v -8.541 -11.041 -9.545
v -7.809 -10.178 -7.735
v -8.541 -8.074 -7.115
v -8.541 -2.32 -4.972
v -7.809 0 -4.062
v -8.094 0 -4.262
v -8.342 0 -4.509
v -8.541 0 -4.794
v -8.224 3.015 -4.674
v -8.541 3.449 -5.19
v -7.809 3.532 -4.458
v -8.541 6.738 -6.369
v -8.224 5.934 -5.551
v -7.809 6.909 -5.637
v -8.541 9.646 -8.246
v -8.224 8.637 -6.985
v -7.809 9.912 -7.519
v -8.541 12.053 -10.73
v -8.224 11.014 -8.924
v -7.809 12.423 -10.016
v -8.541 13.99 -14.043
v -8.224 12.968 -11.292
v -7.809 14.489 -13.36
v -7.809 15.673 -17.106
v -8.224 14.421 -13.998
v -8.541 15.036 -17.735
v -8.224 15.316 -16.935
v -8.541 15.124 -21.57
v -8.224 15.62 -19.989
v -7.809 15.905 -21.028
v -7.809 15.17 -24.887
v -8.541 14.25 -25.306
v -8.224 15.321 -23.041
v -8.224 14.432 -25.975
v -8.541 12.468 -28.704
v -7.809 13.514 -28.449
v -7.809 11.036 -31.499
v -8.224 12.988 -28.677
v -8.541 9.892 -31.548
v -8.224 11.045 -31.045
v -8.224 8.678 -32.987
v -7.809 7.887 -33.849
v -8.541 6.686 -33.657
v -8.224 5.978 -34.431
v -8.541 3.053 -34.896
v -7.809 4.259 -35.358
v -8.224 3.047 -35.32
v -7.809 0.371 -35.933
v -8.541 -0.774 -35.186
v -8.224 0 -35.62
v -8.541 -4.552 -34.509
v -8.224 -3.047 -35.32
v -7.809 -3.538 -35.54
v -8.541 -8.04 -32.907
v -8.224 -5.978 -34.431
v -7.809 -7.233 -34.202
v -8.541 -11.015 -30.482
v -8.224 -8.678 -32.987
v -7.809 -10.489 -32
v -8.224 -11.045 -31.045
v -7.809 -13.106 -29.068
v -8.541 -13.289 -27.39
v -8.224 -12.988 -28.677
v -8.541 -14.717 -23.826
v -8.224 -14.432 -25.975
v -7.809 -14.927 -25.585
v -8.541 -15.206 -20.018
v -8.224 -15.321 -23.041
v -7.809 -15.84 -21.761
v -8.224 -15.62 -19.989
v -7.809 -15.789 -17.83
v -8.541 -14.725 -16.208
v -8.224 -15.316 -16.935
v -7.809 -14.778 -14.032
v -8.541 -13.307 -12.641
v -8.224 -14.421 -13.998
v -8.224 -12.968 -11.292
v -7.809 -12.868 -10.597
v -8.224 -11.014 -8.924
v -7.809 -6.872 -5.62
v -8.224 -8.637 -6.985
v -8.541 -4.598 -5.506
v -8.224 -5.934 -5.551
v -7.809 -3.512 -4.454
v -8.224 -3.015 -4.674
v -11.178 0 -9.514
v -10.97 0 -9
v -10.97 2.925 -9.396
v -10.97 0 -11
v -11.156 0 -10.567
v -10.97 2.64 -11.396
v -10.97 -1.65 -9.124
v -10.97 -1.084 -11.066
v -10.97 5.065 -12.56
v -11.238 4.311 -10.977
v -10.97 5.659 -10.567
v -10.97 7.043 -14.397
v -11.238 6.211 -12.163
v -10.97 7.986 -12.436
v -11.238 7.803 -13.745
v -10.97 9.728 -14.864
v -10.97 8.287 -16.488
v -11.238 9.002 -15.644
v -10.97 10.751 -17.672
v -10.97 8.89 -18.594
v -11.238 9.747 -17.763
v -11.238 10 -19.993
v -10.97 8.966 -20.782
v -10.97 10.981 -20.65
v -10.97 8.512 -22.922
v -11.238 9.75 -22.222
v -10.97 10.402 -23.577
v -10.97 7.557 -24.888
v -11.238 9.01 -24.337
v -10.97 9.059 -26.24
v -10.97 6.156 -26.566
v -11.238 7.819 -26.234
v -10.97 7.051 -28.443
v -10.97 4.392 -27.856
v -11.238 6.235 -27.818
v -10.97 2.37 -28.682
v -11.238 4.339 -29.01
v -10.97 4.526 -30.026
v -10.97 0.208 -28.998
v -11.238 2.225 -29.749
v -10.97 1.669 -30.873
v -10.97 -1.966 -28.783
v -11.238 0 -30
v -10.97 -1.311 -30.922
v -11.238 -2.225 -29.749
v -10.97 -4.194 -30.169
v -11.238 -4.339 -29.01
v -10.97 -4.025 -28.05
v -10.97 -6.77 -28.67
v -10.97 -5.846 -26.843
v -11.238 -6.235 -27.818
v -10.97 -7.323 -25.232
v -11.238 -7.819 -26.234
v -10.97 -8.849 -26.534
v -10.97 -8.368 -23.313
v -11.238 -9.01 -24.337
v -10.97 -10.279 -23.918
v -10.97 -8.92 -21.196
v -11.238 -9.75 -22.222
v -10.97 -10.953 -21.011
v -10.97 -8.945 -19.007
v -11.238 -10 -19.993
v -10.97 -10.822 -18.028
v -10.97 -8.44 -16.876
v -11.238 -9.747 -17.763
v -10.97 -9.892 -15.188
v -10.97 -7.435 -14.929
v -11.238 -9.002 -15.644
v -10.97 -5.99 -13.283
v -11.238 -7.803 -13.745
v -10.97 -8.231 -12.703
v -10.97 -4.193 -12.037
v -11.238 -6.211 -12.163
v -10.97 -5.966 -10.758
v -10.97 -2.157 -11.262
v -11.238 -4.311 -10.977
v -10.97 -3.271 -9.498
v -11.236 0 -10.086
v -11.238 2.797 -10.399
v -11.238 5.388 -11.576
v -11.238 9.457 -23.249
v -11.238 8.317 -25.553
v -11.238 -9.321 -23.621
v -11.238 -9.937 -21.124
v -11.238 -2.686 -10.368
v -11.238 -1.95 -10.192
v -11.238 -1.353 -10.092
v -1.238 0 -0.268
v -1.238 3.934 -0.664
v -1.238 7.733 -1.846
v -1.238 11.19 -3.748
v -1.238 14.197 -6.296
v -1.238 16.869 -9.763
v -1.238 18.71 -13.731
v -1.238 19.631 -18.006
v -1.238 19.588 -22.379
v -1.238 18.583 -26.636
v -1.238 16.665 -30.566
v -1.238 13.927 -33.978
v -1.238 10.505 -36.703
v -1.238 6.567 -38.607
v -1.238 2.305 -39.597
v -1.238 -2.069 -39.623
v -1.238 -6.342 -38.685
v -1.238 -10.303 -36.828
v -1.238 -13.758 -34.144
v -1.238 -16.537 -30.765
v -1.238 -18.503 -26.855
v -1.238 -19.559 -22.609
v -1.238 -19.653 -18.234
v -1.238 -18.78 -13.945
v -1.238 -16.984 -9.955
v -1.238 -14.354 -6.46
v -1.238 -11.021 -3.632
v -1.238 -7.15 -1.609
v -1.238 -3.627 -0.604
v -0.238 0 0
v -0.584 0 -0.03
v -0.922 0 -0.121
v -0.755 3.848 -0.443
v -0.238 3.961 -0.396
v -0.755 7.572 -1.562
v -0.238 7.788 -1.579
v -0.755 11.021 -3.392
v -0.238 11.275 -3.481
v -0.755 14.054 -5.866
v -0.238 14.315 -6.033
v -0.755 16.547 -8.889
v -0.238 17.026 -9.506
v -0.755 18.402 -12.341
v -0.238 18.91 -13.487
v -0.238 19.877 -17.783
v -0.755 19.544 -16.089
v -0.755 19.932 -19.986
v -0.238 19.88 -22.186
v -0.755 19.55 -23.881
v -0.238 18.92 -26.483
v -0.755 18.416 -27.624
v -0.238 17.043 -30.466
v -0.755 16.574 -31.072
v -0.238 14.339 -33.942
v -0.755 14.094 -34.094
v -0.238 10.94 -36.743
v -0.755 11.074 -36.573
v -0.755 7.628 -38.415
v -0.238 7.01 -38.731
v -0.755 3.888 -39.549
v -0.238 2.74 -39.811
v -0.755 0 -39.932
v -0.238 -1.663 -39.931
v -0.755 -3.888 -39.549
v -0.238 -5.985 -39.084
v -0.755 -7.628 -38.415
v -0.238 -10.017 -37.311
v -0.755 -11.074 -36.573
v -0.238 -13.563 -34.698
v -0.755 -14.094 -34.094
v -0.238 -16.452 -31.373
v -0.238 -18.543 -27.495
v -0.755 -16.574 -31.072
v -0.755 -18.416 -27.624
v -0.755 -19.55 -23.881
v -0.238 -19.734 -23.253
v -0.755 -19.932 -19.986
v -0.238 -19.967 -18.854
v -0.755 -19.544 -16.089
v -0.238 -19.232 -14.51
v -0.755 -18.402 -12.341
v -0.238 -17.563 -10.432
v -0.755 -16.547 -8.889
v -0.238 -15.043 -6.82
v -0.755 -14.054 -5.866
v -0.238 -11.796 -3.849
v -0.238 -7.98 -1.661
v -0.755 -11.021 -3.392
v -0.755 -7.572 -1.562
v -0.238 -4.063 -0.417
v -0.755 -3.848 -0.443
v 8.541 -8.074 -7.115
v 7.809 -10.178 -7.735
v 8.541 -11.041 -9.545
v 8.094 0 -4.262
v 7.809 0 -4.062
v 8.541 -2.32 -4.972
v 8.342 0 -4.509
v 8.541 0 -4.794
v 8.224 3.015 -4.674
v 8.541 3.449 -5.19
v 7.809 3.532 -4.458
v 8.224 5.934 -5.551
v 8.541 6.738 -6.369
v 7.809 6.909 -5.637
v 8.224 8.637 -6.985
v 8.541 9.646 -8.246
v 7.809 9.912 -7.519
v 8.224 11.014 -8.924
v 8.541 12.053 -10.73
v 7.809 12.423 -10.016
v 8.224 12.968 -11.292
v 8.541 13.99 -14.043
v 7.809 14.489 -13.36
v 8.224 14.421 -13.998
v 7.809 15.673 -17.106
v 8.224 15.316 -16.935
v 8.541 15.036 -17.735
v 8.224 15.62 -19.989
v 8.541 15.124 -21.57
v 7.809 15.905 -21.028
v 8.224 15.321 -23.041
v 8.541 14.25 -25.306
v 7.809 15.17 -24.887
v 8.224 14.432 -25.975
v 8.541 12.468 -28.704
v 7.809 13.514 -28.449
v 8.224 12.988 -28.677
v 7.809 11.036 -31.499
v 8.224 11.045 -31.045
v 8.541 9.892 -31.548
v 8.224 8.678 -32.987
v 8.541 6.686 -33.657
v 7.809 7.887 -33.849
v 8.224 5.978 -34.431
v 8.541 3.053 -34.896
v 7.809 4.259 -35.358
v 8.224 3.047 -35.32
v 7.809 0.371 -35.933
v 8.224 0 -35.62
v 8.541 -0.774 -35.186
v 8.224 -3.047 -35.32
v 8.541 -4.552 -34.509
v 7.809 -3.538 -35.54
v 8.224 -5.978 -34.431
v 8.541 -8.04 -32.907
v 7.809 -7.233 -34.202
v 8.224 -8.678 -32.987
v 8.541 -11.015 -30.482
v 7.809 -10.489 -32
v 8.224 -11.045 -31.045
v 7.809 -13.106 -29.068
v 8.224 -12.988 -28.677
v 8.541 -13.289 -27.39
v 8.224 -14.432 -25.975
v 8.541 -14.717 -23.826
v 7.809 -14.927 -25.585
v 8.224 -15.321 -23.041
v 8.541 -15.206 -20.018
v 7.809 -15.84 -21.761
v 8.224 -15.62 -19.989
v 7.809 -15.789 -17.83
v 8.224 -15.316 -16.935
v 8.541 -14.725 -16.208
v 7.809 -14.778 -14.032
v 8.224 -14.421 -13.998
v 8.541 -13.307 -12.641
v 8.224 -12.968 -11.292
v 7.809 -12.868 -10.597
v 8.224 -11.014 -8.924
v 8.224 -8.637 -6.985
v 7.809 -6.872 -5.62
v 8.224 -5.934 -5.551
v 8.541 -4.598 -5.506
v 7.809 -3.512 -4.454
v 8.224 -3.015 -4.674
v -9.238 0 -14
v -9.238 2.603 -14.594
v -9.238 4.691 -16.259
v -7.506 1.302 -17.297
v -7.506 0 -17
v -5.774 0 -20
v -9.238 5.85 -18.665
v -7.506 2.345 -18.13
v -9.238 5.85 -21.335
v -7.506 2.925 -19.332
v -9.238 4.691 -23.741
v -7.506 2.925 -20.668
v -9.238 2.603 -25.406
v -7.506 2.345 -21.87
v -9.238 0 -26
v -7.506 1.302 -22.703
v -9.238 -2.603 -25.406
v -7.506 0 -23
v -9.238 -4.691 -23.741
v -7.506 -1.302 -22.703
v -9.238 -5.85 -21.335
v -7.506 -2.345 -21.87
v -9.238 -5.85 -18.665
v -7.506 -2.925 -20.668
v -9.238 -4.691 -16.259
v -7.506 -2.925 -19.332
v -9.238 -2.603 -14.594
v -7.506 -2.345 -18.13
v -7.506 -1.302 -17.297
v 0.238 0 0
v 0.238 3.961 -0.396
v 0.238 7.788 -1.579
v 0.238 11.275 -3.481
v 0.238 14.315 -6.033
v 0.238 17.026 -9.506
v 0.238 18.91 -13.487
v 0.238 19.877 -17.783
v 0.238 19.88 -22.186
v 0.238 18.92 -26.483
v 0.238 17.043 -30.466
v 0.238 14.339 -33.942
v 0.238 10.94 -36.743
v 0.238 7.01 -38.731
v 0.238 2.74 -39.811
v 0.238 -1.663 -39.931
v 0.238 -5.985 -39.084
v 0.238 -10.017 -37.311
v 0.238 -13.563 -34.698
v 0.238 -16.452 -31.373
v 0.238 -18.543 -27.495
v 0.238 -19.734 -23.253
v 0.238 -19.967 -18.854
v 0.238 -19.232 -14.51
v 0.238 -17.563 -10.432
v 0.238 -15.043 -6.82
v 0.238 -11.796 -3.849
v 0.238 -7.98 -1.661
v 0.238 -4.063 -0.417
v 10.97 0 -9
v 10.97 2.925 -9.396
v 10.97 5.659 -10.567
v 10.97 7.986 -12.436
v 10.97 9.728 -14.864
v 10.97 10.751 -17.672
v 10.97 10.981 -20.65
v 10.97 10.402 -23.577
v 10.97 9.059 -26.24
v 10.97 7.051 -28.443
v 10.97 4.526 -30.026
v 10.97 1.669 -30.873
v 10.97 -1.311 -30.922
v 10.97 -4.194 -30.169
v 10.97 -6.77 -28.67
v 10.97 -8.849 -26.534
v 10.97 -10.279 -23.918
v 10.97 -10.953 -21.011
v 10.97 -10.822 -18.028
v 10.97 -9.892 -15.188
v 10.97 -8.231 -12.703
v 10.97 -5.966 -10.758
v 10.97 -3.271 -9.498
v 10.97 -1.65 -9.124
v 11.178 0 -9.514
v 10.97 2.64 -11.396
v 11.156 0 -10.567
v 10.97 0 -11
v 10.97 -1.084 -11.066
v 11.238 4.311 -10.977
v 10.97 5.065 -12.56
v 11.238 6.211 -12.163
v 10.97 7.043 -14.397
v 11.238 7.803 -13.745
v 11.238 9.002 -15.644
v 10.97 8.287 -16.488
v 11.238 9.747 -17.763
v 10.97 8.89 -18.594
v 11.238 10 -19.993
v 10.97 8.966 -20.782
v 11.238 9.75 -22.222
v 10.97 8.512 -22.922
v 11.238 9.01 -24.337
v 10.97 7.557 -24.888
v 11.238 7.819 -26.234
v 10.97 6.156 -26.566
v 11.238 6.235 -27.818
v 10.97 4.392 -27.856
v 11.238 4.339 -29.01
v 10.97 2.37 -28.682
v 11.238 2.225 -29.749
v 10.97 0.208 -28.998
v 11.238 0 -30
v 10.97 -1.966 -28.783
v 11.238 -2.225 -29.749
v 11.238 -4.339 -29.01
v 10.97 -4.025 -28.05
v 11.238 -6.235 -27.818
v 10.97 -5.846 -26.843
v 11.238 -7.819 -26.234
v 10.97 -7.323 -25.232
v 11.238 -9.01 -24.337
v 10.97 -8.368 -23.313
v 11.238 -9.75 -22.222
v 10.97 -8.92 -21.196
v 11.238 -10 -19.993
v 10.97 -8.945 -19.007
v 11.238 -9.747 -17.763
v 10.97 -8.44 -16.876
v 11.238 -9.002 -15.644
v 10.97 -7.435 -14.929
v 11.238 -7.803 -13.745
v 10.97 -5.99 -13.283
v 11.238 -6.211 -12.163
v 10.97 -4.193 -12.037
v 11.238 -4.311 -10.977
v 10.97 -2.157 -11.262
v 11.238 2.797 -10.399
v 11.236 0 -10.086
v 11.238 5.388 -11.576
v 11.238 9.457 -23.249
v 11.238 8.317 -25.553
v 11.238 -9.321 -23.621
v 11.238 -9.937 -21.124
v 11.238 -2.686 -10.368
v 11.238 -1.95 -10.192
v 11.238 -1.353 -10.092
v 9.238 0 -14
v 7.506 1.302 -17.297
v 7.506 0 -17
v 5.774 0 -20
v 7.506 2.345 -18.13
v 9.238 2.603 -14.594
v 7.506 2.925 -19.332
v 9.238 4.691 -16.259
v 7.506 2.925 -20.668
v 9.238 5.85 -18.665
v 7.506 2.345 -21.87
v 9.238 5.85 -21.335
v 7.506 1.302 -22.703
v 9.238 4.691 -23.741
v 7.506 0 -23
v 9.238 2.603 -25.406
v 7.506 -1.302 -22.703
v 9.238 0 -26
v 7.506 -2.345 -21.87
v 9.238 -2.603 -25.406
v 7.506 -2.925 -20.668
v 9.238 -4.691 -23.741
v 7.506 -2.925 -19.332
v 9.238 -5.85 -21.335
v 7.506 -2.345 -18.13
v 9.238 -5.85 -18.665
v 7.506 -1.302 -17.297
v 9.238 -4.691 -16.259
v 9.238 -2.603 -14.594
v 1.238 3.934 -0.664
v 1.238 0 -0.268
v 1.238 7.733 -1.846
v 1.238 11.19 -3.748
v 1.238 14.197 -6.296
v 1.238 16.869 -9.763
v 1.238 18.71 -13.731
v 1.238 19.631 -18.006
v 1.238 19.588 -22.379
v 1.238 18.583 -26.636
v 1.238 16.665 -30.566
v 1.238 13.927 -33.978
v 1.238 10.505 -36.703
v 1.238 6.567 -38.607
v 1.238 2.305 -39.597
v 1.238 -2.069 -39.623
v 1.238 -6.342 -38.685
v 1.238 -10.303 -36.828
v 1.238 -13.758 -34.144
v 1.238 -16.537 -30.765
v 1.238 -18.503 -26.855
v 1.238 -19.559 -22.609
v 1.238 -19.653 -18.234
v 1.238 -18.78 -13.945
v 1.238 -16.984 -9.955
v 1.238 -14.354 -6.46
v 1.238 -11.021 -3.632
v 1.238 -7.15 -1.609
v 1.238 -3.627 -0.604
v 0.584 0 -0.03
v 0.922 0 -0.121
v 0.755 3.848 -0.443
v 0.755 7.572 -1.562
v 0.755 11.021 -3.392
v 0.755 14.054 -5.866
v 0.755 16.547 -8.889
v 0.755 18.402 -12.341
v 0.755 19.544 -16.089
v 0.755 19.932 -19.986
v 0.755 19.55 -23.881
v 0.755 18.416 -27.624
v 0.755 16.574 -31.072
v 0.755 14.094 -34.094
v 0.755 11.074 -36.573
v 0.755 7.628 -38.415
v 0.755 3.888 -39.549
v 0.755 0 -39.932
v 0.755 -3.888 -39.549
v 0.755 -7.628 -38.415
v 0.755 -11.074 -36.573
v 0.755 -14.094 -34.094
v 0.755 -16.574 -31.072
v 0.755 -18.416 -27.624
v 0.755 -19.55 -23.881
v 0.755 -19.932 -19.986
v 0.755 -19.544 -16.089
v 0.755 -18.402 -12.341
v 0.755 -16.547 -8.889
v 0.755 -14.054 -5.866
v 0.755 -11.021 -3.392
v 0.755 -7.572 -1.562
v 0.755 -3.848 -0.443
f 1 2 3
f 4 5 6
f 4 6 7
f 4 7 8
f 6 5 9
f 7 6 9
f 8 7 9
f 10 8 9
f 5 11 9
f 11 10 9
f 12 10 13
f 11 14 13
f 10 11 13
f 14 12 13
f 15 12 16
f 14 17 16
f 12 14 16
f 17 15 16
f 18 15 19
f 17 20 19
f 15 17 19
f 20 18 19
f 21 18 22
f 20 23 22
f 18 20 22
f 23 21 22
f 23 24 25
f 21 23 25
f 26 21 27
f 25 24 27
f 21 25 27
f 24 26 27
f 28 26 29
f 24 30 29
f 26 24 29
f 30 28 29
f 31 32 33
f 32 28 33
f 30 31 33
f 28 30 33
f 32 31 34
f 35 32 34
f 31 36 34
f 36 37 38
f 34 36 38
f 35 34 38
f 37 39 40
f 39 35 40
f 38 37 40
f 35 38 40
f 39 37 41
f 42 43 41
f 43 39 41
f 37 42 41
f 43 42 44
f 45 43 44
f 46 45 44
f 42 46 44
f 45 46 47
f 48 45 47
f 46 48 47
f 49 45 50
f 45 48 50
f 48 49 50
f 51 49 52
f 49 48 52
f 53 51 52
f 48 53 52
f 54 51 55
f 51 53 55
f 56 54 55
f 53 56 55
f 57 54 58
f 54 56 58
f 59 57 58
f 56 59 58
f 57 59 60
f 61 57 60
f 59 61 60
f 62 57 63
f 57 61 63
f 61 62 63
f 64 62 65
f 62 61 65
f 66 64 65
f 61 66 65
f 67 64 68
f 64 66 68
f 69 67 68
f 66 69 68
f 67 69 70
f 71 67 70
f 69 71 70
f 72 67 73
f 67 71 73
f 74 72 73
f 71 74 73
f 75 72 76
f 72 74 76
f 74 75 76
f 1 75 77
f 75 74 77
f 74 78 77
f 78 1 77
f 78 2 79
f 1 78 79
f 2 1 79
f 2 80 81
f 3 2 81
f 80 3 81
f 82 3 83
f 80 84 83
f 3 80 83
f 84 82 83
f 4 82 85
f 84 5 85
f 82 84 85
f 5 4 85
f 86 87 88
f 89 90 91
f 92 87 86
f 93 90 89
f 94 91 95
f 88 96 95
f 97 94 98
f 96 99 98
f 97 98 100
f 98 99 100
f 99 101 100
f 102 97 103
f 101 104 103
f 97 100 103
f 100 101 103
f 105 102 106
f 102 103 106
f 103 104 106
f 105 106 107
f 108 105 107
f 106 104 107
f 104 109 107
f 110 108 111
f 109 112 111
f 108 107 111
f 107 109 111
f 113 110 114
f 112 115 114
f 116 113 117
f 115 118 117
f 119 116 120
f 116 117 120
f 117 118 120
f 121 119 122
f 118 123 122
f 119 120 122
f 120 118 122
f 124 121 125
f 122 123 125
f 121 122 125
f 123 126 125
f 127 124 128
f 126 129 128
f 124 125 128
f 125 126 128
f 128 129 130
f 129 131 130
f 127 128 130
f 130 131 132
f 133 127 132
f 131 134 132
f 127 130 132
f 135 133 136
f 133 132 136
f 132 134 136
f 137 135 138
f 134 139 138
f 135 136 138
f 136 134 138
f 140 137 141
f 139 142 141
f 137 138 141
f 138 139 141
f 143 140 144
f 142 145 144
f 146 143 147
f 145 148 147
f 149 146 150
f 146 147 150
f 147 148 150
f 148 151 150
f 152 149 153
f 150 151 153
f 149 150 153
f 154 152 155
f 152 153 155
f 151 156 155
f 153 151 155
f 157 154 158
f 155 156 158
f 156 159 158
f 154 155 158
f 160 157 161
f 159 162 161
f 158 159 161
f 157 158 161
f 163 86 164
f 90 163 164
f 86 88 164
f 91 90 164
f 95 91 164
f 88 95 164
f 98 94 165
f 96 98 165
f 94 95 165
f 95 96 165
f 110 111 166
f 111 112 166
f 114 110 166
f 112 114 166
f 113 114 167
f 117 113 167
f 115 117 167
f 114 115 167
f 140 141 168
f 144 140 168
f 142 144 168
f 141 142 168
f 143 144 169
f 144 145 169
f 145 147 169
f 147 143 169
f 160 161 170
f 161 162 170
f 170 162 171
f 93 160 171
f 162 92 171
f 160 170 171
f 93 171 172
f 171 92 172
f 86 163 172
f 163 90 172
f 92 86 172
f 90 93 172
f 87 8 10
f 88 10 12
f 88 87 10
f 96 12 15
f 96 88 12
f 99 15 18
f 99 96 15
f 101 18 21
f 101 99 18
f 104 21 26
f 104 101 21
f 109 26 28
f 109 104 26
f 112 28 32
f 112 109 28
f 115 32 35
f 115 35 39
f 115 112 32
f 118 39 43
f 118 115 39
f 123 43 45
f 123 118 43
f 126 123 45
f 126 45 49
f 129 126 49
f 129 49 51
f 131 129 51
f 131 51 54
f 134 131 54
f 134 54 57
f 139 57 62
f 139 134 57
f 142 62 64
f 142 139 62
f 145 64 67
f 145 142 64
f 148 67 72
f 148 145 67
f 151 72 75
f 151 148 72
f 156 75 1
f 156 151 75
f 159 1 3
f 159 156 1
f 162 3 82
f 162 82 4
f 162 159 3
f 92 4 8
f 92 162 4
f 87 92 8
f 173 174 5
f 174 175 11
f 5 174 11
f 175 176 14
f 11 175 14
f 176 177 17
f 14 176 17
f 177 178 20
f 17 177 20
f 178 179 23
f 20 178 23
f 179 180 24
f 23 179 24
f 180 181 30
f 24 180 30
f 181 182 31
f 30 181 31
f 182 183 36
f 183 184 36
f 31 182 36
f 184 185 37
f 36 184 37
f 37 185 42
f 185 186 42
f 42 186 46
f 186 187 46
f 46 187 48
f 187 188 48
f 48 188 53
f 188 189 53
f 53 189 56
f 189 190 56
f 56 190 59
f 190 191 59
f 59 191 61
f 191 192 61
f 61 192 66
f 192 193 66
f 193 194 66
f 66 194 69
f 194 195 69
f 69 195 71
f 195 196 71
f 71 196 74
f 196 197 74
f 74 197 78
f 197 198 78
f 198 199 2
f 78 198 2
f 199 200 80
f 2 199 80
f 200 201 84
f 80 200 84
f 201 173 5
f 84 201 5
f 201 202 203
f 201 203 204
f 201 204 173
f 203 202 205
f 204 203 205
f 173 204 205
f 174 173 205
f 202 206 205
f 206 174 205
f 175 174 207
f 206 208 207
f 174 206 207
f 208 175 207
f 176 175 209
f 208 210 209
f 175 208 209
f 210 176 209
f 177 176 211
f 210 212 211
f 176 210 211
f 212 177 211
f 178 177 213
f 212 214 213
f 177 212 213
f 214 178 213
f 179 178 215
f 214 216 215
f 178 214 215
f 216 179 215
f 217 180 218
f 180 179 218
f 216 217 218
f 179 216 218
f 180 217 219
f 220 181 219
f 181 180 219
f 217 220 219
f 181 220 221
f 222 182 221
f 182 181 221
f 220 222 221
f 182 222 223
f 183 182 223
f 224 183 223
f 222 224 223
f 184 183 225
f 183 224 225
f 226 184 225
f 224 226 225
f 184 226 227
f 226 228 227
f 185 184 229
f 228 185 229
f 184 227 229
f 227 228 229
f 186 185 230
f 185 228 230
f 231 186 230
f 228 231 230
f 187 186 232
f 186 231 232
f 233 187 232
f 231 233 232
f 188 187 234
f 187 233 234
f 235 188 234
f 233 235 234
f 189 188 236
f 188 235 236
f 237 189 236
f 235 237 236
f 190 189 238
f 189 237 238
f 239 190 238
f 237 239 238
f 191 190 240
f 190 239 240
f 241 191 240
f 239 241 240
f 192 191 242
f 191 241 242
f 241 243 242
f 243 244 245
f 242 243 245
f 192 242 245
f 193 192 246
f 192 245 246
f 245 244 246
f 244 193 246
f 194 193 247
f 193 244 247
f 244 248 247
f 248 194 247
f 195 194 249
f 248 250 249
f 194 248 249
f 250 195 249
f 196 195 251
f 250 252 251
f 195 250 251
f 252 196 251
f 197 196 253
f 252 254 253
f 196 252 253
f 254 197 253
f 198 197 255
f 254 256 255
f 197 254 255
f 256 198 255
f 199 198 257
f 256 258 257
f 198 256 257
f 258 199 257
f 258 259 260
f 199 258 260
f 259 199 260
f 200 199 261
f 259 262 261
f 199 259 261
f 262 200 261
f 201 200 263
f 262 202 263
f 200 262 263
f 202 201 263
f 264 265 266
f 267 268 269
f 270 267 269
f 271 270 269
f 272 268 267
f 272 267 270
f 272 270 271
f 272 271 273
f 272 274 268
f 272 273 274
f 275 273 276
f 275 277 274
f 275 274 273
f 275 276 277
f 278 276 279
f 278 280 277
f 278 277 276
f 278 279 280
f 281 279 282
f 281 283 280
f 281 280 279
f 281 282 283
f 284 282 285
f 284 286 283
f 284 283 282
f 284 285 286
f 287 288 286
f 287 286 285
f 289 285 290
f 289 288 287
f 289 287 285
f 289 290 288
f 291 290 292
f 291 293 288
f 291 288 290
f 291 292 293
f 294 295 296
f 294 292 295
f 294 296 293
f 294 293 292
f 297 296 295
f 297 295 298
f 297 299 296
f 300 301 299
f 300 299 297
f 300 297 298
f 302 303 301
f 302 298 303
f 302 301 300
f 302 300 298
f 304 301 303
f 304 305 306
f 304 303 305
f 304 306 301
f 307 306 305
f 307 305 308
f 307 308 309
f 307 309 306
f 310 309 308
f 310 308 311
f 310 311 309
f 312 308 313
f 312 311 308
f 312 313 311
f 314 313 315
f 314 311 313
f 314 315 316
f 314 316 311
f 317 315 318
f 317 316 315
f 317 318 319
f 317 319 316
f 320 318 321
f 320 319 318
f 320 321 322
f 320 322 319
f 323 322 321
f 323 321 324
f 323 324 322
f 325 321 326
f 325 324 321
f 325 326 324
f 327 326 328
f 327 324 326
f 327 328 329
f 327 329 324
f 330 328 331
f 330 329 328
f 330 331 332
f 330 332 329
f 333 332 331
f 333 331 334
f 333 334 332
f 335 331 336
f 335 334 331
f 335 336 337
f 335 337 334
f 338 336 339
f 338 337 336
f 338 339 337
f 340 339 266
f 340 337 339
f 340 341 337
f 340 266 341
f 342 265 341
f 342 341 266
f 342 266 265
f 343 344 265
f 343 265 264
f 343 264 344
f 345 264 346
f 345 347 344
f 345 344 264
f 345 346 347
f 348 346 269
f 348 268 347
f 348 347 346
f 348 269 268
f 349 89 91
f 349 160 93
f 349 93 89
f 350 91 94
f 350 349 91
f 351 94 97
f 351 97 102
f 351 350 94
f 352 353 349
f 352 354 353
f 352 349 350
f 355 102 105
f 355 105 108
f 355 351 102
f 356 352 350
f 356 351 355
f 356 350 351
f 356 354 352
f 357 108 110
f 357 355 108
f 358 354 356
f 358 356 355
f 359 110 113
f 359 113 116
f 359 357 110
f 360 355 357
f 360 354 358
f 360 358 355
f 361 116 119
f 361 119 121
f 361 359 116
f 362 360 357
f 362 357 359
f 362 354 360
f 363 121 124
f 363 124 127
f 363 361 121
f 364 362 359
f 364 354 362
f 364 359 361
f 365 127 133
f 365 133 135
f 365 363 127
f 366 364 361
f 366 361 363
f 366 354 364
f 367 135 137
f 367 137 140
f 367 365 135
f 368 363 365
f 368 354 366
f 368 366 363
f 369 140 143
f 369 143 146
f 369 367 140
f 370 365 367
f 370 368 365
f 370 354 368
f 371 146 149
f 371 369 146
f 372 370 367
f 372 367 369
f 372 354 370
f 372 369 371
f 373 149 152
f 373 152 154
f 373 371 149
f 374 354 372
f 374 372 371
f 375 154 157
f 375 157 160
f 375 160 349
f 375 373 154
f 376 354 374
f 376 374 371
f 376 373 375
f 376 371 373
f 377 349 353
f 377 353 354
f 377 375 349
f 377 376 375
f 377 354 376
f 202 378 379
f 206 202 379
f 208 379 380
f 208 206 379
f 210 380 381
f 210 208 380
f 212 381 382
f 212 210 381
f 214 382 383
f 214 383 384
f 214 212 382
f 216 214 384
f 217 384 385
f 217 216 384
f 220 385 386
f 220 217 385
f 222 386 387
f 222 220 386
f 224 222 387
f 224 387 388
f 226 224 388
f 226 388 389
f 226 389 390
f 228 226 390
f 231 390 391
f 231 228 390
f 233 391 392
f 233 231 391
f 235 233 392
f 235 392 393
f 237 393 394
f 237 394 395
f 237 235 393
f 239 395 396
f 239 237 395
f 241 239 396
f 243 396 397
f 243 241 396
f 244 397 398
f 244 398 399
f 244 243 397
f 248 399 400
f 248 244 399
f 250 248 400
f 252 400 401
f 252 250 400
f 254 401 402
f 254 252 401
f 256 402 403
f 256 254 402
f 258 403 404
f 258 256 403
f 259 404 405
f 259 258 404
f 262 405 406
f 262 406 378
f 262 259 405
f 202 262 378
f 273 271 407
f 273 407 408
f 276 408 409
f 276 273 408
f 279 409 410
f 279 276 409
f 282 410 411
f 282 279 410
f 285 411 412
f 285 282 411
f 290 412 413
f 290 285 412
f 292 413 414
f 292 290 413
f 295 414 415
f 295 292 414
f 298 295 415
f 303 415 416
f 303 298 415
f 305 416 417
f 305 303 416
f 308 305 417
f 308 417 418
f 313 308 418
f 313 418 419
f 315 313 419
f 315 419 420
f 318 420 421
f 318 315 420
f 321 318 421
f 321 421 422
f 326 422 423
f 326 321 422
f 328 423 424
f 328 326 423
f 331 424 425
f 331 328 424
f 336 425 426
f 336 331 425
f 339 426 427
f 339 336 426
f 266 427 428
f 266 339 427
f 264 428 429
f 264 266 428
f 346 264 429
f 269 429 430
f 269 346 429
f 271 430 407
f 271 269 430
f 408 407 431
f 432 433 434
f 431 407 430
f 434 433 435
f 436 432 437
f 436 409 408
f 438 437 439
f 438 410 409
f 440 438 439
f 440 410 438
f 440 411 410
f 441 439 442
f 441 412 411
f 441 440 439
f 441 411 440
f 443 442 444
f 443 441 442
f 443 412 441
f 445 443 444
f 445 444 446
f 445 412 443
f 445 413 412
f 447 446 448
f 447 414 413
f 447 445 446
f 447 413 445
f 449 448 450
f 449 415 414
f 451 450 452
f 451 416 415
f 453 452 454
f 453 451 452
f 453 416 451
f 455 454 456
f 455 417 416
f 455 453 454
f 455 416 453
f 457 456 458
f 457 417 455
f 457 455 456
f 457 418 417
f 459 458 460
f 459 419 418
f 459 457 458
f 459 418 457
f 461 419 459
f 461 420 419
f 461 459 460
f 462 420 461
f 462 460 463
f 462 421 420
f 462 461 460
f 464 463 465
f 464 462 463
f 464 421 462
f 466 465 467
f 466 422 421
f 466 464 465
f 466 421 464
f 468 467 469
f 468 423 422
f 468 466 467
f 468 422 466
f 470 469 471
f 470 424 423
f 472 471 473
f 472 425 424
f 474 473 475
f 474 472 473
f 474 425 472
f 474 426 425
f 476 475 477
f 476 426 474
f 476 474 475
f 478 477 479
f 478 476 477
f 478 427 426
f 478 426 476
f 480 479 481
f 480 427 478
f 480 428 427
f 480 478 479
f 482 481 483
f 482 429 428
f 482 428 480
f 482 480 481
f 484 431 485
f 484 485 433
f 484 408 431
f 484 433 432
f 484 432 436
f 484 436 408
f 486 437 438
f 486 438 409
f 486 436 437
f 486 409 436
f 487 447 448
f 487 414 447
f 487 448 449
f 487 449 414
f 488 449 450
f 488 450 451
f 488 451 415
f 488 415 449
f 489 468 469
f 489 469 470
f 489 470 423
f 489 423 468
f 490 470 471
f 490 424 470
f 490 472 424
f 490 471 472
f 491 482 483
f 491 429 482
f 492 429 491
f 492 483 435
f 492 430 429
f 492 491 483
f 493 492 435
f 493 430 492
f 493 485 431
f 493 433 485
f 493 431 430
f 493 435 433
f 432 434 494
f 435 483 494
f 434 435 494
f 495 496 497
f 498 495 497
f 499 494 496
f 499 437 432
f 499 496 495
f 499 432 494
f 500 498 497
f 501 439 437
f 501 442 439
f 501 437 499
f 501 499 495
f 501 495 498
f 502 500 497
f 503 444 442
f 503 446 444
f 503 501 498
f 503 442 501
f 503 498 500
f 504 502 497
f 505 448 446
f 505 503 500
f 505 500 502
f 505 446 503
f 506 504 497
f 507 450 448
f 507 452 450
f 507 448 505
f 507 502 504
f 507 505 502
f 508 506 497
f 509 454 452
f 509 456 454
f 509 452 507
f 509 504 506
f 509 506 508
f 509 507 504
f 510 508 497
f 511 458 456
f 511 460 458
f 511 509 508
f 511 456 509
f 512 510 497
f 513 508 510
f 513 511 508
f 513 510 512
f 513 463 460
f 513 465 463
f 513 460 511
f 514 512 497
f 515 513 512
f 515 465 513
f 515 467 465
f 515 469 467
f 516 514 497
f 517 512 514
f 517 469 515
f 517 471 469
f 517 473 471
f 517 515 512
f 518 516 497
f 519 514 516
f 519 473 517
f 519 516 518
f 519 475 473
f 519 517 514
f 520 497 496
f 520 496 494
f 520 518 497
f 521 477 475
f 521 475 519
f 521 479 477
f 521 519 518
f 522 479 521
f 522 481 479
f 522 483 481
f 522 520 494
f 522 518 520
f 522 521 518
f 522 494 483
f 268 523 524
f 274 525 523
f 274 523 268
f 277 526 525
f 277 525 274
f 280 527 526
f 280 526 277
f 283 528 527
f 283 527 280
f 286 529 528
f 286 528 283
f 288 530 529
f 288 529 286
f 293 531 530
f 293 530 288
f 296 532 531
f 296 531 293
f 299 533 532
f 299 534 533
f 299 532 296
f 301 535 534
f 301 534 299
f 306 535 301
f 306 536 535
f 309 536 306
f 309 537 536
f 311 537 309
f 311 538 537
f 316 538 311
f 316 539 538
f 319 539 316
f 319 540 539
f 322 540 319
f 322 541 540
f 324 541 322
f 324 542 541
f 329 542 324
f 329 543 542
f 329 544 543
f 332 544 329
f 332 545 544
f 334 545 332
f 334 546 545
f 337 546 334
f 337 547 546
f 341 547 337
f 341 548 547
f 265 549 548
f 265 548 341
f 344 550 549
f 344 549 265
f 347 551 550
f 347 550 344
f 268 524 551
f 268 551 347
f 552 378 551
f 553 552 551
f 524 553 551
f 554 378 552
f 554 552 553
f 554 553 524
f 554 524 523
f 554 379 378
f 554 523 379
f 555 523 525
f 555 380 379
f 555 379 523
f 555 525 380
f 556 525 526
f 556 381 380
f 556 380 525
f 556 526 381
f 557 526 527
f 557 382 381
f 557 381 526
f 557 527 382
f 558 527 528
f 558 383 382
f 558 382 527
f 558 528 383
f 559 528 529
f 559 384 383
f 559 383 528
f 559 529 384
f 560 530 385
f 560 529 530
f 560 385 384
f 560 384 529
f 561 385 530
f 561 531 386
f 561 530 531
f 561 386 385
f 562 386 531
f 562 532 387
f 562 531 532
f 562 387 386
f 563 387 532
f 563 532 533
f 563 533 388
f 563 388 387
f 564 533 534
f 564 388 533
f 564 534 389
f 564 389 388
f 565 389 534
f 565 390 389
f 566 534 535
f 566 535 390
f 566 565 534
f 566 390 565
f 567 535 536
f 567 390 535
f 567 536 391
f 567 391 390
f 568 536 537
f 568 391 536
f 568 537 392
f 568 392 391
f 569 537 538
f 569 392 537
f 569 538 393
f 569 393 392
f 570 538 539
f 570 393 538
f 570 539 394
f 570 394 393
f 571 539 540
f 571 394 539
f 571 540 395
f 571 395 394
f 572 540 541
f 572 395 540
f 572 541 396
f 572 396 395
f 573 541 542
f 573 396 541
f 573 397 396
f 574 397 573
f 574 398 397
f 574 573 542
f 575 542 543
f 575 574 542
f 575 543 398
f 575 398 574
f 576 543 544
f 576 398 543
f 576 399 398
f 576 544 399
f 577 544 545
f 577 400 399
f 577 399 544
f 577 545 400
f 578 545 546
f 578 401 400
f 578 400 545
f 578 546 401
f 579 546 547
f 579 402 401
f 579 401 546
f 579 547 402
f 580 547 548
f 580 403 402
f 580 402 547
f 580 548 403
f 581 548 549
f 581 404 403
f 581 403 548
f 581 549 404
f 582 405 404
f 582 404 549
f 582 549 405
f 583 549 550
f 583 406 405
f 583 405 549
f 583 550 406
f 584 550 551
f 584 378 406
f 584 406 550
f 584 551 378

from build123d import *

# Parameters (mm, degrees)
F2_SIZE = 5
F3_R    = 2


with BuildPart() as f1:
    # F0 (on Front) → F1 (revolve)
    with BuildSketch(Plane.XZ):
        Polygon((5.7735026919, 0), (-5.7735026919, 0), (-11.5470053838, -10), (-5.7735026919, -20), (5.7735026919, -20), (11.5470053838, -10), align=None)
    revolve(axis=Axis((0, 0, -20), (-1, 0, 0)))

    # F2
    f2_edges = [f1.edges().sort_by_distance(p)[0] for p in [
        (5.773503, 0, -40),
        (-5.773503, 0, -40),
        (0, 0, 0),
    ]]
    chamfer(f2_edges, length=F2_SIZE)

    # F3
    f3_edges = [f1.edges().sort_by_distance(p)[0] for p in [
        (-11.547005, 0, -30),
        (-8.273503, 0, -35.669869),
        (-0.773503, 0, -39.999995),
        (0.773503, 0, -39.999995),
        (8.273503, 0, -35.669869),
        (11.547005, 0, -30),
        (8.660254, 0, -15),
    ]]
    fillet(f3_edges, radius=F3_R)


solid = f1.part
